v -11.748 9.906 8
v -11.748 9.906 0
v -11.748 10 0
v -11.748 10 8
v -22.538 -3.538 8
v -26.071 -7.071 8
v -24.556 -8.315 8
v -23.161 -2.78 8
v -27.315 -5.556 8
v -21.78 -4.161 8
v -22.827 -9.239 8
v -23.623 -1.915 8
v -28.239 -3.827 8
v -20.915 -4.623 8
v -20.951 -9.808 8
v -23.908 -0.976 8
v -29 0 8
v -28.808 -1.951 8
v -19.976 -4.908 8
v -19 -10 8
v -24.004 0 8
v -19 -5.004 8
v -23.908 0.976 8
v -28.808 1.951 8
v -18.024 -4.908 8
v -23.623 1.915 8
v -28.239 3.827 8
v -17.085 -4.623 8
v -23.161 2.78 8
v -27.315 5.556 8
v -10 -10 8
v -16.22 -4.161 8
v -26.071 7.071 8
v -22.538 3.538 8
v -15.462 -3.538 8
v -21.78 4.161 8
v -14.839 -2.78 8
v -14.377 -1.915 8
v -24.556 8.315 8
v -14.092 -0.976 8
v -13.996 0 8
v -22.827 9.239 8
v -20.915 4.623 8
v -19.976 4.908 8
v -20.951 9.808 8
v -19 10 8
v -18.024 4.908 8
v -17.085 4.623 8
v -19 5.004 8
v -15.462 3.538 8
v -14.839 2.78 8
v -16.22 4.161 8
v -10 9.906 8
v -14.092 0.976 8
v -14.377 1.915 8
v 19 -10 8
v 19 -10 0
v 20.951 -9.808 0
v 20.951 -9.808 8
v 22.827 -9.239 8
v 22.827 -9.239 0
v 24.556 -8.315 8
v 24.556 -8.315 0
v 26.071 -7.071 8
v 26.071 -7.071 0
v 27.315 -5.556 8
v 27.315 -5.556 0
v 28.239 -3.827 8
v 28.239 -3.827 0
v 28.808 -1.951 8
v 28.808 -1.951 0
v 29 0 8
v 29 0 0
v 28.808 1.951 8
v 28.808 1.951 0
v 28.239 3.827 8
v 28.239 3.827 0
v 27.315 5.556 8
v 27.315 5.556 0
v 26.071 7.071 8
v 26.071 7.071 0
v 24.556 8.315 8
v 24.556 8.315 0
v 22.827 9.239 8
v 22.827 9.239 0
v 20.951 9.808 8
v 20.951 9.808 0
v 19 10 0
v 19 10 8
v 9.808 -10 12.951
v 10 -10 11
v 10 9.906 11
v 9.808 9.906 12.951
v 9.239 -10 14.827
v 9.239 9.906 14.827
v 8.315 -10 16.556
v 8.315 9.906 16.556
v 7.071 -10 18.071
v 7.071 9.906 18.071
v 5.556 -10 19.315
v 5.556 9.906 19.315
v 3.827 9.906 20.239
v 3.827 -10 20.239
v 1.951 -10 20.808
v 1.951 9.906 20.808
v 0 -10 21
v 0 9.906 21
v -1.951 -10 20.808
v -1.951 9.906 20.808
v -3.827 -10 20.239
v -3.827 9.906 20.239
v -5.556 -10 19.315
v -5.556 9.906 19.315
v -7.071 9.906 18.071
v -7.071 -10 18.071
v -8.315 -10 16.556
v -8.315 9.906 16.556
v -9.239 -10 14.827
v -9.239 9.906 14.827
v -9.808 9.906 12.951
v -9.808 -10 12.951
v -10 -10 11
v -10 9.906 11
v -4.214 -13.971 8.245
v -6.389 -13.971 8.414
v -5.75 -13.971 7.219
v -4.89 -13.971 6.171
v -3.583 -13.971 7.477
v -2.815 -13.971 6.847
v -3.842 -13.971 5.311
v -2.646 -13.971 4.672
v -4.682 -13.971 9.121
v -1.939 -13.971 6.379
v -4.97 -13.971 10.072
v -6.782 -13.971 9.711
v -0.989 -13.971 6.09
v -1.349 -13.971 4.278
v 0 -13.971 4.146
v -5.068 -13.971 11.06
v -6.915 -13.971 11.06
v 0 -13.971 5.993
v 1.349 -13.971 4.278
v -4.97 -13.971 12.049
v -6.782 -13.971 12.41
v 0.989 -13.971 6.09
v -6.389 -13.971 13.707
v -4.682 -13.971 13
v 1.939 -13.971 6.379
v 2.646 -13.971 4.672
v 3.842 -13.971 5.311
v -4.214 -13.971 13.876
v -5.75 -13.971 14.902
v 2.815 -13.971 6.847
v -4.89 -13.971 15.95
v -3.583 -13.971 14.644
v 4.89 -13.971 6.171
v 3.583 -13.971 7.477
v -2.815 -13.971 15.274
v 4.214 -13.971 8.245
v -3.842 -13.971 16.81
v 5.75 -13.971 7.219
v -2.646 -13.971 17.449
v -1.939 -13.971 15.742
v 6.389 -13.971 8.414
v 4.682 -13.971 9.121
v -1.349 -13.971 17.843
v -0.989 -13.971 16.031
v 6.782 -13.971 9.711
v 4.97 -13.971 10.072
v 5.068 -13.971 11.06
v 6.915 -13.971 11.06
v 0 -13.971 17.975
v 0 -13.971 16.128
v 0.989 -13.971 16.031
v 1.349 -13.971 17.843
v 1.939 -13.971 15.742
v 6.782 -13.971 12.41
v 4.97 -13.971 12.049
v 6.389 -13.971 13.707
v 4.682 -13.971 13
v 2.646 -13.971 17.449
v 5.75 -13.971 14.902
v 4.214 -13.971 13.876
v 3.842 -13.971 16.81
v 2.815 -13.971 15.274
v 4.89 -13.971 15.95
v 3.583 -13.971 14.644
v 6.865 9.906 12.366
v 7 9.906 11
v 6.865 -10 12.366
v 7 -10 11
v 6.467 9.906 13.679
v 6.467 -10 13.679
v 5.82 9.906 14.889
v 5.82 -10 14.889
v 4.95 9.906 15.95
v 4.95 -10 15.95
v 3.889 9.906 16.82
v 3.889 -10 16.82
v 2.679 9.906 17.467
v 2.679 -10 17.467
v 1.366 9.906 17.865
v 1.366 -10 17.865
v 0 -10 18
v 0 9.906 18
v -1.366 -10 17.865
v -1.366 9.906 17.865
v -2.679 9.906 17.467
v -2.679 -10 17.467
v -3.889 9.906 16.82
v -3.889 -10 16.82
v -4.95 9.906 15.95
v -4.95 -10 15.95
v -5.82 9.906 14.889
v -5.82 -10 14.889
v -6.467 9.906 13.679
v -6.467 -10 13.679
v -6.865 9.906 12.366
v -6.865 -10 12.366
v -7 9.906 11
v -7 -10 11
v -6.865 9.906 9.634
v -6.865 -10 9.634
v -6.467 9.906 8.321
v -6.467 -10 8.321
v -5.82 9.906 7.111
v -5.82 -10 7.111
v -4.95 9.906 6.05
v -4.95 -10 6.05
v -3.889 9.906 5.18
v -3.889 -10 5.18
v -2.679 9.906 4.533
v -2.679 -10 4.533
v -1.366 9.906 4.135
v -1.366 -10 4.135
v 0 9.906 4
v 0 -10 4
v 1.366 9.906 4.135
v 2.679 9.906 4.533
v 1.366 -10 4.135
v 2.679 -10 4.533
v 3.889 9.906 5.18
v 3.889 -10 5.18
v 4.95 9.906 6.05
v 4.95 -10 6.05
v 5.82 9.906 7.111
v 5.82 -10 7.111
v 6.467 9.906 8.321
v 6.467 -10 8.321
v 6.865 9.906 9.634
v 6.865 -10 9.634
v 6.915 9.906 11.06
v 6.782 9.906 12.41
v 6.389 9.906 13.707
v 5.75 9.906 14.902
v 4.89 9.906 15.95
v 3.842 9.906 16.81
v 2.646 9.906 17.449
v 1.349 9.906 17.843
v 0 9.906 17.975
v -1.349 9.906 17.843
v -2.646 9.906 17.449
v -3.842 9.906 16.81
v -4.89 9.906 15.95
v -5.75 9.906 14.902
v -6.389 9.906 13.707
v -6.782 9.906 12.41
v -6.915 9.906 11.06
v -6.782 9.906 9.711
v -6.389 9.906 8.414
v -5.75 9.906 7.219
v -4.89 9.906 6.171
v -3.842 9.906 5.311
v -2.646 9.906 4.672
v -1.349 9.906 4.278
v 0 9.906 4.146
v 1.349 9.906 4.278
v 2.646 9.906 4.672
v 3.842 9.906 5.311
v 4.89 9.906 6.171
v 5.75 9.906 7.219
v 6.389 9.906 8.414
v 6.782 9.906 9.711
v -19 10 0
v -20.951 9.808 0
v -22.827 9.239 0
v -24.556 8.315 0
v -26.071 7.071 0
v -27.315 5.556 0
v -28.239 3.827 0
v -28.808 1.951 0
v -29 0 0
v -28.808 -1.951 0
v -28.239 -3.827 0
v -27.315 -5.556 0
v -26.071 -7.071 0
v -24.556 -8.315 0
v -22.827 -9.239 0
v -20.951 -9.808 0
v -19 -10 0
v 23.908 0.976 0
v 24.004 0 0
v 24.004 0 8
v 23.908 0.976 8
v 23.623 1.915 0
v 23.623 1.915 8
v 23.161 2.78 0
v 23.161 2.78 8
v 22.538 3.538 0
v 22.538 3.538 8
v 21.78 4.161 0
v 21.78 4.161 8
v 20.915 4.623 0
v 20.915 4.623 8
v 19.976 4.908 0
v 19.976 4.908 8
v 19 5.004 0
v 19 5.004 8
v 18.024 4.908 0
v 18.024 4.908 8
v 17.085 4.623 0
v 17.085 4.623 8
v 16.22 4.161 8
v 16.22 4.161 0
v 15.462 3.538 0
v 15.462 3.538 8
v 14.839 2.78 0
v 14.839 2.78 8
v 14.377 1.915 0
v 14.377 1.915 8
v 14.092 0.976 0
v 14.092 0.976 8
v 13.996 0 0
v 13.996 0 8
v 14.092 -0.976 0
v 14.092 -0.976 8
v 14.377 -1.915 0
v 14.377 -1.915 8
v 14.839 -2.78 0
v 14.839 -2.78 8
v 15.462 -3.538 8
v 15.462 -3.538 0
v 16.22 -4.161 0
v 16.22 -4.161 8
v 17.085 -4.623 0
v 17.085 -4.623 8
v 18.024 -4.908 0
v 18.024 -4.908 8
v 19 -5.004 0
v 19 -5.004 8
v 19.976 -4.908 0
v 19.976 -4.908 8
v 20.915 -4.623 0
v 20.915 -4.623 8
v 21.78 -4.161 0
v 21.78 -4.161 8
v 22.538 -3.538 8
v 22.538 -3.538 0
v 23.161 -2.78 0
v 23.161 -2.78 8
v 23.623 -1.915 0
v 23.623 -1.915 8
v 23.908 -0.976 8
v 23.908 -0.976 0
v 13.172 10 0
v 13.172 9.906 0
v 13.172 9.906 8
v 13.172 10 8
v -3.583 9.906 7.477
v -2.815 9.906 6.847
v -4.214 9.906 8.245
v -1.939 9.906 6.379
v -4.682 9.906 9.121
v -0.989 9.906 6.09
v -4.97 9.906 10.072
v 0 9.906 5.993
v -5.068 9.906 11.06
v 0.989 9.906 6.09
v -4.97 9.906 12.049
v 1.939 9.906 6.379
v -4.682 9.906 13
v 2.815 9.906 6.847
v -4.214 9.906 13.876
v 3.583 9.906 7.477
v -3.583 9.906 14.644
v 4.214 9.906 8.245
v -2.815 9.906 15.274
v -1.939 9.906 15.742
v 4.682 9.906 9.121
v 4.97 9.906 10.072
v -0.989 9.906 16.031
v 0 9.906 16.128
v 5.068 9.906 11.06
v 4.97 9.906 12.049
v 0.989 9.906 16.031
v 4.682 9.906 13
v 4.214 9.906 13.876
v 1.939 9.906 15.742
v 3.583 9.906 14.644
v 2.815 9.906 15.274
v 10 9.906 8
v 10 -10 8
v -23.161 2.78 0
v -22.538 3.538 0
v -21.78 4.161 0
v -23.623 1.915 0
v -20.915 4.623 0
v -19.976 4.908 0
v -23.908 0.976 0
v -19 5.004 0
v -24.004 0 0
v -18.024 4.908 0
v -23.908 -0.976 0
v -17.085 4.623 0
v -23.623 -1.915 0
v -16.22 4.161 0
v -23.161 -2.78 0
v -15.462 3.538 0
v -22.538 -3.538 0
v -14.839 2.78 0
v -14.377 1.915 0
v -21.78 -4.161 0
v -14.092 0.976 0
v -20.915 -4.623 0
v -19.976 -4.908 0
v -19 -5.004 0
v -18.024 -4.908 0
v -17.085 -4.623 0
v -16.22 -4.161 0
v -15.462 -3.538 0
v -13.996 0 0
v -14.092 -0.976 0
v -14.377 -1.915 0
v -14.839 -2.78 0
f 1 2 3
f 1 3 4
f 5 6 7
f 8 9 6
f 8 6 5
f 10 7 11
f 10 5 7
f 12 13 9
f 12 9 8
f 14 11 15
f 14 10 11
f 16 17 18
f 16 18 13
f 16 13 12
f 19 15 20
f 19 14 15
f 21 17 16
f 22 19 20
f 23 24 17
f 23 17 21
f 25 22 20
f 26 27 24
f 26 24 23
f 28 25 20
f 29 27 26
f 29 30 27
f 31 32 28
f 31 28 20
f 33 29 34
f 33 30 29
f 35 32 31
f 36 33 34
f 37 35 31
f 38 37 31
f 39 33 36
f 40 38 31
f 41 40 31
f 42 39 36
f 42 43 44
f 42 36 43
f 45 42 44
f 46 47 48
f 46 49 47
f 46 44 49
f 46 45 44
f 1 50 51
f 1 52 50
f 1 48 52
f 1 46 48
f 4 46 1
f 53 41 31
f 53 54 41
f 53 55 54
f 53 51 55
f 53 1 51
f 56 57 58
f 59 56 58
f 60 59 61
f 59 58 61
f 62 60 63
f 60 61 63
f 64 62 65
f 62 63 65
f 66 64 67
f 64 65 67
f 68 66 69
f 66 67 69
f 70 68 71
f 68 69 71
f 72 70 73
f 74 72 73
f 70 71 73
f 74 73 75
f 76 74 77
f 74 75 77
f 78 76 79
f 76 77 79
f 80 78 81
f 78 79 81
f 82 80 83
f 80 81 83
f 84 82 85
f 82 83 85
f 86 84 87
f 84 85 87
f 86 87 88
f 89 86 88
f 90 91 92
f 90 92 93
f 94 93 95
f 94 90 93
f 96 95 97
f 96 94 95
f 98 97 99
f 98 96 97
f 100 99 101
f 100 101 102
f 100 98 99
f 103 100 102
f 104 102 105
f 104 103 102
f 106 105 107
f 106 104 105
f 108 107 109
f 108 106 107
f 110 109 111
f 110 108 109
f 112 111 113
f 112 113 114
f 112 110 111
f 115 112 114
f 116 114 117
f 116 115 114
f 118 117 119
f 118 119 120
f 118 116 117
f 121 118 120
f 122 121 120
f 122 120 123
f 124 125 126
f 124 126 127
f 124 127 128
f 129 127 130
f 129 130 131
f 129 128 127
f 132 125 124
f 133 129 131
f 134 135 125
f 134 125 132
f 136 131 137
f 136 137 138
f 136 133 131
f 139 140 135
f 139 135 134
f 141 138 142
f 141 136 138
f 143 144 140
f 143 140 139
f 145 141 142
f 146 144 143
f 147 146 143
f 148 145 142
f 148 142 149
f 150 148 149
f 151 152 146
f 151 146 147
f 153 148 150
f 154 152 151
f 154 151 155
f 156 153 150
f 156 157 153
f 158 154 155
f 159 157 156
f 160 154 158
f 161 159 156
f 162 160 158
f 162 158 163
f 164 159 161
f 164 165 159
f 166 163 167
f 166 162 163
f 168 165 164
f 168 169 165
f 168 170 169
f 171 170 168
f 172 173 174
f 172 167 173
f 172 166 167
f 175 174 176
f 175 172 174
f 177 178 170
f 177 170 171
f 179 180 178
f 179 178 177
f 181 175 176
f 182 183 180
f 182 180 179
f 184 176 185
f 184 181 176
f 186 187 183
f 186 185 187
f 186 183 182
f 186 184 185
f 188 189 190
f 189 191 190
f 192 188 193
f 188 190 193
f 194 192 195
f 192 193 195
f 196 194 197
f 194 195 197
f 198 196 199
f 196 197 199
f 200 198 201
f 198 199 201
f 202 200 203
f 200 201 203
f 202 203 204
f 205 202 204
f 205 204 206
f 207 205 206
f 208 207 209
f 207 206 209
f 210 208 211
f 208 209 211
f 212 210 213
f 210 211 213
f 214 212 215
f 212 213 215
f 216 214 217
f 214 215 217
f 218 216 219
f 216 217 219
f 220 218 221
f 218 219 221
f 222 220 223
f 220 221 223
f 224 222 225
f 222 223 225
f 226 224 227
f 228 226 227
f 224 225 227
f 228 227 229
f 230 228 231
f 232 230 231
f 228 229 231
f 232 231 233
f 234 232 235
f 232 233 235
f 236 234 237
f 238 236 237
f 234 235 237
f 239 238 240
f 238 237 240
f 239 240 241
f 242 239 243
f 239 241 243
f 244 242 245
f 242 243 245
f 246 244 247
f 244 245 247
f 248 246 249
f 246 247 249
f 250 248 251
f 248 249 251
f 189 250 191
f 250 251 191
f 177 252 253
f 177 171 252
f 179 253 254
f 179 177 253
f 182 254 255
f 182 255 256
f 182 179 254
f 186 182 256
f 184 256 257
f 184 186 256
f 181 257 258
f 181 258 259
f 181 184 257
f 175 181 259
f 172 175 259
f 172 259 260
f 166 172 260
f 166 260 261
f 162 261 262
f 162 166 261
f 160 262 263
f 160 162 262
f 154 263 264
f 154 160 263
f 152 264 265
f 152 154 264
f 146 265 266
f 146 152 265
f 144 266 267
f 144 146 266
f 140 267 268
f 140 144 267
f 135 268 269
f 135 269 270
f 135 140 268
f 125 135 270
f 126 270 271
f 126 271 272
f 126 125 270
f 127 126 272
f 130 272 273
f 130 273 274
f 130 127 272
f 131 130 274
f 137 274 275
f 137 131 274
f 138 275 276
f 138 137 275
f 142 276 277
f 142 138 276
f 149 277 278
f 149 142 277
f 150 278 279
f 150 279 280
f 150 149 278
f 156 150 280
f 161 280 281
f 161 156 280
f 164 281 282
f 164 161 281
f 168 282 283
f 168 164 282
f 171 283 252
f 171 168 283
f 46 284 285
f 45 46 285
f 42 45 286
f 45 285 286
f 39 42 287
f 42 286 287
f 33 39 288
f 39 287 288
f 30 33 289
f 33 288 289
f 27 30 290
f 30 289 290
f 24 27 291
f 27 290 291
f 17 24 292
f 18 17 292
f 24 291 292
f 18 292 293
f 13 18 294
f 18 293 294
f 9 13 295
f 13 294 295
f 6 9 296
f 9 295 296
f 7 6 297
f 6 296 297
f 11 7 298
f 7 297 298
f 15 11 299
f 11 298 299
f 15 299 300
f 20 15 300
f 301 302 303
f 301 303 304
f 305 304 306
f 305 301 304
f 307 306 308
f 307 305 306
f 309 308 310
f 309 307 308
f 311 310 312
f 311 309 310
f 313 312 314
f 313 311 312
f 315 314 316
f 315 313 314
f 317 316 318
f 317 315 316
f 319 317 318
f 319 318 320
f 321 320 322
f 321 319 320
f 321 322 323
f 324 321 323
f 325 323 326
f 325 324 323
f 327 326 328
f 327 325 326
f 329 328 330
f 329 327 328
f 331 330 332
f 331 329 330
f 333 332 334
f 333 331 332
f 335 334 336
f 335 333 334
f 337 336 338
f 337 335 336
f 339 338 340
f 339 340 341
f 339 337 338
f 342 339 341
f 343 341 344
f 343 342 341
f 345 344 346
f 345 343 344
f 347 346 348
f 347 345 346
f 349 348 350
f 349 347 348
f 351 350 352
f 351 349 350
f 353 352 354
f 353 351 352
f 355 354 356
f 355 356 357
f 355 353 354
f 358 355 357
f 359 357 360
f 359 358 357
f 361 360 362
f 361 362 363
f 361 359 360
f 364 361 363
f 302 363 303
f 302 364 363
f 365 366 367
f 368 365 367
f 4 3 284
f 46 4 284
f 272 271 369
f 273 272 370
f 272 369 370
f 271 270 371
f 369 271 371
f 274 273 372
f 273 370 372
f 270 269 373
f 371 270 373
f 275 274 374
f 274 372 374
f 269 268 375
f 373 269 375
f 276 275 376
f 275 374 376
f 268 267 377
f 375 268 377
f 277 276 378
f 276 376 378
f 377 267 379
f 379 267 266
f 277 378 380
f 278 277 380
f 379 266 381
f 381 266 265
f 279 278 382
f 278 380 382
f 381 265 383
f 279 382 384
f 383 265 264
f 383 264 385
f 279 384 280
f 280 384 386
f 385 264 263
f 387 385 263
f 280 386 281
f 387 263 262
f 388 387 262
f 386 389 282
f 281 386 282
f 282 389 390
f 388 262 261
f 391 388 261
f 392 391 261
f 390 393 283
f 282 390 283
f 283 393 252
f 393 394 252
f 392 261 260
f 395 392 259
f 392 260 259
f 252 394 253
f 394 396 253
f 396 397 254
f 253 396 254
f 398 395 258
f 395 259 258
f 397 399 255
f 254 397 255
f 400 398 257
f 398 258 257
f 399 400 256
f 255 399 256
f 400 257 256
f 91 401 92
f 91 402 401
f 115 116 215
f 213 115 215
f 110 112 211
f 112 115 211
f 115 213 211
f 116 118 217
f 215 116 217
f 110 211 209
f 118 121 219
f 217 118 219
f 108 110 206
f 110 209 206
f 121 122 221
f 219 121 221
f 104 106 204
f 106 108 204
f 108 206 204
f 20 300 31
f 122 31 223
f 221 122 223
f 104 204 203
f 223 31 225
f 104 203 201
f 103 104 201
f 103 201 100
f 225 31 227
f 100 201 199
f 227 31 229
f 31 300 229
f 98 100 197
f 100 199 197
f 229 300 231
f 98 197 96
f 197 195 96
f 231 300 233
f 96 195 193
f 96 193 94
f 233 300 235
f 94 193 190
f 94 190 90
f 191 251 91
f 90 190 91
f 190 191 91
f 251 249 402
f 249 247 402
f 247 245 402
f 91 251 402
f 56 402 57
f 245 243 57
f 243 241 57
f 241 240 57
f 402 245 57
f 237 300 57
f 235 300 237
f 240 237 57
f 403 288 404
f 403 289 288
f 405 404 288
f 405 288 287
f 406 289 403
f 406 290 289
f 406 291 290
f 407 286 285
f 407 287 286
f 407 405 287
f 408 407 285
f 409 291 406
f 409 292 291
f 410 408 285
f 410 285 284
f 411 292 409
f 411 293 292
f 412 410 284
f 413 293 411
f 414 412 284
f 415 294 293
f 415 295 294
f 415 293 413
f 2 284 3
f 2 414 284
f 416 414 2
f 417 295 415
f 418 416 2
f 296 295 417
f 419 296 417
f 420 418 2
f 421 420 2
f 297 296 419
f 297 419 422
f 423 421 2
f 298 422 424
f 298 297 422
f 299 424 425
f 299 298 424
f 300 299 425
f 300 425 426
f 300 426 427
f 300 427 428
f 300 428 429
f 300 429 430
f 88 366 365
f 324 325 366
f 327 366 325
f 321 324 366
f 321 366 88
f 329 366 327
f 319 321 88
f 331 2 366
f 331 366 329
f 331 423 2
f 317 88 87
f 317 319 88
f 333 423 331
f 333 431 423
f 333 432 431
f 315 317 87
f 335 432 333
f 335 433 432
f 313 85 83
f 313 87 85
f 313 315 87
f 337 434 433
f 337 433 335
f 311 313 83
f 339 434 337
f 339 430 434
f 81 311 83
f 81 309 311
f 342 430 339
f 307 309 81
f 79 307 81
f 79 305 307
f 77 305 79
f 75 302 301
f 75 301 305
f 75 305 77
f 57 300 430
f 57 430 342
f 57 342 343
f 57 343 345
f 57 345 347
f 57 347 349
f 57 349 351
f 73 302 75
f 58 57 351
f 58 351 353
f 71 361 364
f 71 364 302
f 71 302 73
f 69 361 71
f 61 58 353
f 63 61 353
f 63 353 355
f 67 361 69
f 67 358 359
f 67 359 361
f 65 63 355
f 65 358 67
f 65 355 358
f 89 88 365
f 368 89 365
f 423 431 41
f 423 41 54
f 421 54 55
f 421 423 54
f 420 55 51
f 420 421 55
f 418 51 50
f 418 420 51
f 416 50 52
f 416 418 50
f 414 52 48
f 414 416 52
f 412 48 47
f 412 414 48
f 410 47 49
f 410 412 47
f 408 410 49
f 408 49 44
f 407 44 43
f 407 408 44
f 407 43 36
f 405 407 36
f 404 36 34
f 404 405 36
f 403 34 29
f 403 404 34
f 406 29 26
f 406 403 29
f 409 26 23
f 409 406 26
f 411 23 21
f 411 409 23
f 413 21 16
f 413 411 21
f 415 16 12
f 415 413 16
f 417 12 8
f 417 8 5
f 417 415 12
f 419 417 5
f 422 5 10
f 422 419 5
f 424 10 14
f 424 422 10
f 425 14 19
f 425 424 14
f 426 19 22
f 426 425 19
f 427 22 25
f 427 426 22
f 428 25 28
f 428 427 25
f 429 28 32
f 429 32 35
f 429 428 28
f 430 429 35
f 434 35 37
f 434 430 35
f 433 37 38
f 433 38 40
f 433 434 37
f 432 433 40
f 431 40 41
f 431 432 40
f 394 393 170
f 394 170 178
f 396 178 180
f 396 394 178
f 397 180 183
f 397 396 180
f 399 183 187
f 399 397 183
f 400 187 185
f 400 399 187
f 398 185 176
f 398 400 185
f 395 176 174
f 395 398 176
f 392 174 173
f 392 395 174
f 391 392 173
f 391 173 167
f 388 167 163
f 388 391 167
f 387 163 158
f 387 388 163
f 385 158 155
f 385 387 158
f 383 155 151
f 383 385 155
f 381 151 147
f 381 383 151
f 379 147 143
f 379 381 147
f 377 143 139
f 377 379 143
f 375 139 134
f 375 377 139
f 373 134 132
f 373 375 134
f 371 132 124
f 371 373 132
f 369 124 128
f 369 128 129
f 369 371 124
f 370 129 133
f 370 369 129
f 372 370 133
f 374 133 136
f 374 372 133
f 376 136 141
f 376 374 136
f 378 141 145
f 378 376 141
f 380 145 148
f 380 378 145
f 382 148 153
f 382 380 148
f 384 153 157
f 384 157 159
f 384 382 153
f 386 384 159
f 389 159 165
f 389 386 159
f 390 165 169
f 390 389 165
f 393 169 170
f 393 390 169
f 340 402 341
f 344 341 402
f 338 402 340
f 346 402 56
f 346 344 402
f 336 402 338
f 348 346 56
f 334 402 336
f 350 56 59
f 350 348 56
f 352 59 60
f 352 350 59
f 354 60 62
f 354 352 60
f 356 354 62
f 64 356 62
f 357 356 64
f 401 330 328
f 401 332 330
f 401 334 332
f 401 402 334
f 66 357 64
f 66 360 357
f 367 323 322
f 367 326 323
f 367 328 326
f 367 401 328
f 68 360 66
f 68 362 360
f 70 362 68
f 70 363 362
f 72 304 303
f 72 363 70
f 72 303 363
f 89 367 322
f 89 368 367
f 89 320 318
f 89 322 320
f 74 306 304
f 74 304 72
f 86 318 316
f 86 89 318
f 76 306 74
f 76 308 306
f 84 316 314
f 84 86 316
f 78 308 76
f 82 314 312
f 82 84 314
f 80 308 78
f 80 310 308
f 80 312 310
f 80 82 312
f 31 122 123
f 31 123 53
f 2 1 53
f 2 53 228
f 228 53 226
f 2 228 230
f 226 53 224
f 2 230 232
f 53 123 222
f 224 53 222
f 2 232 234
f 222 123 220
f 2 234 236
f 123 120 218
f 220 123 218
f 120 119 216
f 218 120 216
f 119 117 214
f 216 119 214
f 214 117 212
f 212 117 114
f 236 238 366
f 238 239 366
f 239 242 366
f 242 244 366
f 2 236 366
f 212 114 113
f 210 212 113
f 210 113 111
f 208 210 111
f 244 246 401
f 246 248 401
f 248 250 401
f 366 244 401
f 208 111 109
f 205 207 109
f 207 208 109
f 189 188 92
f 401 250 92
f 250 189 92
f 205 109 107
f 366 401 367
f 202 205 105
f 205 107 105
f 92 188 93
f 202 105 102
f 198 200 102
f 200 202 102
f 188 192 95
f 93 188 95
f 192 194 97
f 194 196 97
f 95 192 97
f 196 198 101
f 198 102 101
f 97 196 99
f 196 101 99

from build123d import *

# Parameters (mm, degrees)
F0_R      = 5.0038
F1_DEPTH  = 8
F3_R      = 7
F4_DEPTH  = 10.001
F5_DEPTH  = 25.4
F2_R      = 7
F6_DEPTH  = 20.0152
F7_DEPTH  = 4
F8_R      = 6.9149317759
F8_R_2    = 5.0676799546
F9_DEPTH  = 13.97127
F11_W     = 24.9205389991
F11_H     = 28.2232568134
F12_DEPTH = 25.4


# Not quite as in the source:
# - a feature of the source that left no trace in its solid (it failed there, or was rolled back) is left out


with BuildPart() as f1:
    # F0 (on Top) → F1 (new body)
    with BuildSketch(Plane.XY):
        with BuildLine():
            ThreePointArc((-19, 10), (-29, 0), (-19, -10))
            Line((-19, -10), (19, -10))
            ThreePointArc((19, -10), (29, 0), (19, 10))
            Line((19, 10), (-19, 10))
        make_face()
        with Locations((-19, 0)):
            Circle(F0_R, mode=Mode.SUBTRACT)
        with Locations((19, 0)):
            Circle(F0_R, mode=Mode.SUBTRACT)
    extrude(amount=F1_DEPTH)

    # F3 (on Front) → F4 (cut, through all)
    with BuildSketch(Plane.XZ):
        with Locations((0, 11)):
            Circle(F3_R)
    extrude(amount=-F4_DEPTH, mode=Mode.SUBTRACT)

    # F5 (cut): a face of the model
    f5_faces = [f1.faces().sort_by_distance(p)[0] for p in [
        (0, 0, 6.3529291392),
    ]]
    extrude(f5_faces, amount=-F5_DEPTH, mode=Mode.SUBTRACT)

    # F2 (on face) → F6 (join)
    with BuildSketch(Plane.XZ.offset(10)):
        with BuildLine():
            Line((10, 0), (10, 8))
            Line((10, 8), (10, 11))
            ThreePointArc((10, 11), (0, 21), (-10, 11))
            Line((-10, 11), (-10, 8))
            Line((-10, 8), (-10, 0))
            Line((-10, 0), (10, 0))
        make_face()
        with Locations((0, 11)):
            Circle(F2_R, mode=Mode.SUBTRACT)
    extrude(amount=-F6_DEPTH)

    # F7 (add): a face of the model
    f7_faces = [f1.faces().sort_by_distance(p)[0] for p in [
        (9.71, 10.0152, 5.5),
    ]]
    extrude(f7_faces, amount=F7_DEPTH)


with BuildPart() as f9:
    # F8 (on Front) → F9 (new body, symmetric)
    with BuildSketch(Plane.XZ):
        with Locations((0, 11.0604921356)):
            Circle(F8_R)
        with Locations((0, 11.0604921356)):
            Circle(F8_R_2, mode=Mode.SUBTRACT)
    extrude(amount=F9_DEPTH, both=True)


with BuildPart() as f12_tool:
    # F11 (on offset) → F12 (new body)
    with BuildSketch(Plane.XZ.offset(-9.906)):
        with Locations((0.7121074013, 11.3045781618)):
            Rectangle(F11_W, F11_H)
    extrude(amount=-F12_DEPTH)


with BuildPart() as f1_1:
    add(f1.part)

    # F12: cut by f12_tool
    add(f12_tool.part, mode=Mode.SUBTRACT)


with BuildPart() as f9_1:
    add(f9.part)

    # F12: cut by f12_tool
    add(f12_tool.part, mode=Mode.SUBTRACT)


solid = Compound([f1_1.part, f9_1.part])
